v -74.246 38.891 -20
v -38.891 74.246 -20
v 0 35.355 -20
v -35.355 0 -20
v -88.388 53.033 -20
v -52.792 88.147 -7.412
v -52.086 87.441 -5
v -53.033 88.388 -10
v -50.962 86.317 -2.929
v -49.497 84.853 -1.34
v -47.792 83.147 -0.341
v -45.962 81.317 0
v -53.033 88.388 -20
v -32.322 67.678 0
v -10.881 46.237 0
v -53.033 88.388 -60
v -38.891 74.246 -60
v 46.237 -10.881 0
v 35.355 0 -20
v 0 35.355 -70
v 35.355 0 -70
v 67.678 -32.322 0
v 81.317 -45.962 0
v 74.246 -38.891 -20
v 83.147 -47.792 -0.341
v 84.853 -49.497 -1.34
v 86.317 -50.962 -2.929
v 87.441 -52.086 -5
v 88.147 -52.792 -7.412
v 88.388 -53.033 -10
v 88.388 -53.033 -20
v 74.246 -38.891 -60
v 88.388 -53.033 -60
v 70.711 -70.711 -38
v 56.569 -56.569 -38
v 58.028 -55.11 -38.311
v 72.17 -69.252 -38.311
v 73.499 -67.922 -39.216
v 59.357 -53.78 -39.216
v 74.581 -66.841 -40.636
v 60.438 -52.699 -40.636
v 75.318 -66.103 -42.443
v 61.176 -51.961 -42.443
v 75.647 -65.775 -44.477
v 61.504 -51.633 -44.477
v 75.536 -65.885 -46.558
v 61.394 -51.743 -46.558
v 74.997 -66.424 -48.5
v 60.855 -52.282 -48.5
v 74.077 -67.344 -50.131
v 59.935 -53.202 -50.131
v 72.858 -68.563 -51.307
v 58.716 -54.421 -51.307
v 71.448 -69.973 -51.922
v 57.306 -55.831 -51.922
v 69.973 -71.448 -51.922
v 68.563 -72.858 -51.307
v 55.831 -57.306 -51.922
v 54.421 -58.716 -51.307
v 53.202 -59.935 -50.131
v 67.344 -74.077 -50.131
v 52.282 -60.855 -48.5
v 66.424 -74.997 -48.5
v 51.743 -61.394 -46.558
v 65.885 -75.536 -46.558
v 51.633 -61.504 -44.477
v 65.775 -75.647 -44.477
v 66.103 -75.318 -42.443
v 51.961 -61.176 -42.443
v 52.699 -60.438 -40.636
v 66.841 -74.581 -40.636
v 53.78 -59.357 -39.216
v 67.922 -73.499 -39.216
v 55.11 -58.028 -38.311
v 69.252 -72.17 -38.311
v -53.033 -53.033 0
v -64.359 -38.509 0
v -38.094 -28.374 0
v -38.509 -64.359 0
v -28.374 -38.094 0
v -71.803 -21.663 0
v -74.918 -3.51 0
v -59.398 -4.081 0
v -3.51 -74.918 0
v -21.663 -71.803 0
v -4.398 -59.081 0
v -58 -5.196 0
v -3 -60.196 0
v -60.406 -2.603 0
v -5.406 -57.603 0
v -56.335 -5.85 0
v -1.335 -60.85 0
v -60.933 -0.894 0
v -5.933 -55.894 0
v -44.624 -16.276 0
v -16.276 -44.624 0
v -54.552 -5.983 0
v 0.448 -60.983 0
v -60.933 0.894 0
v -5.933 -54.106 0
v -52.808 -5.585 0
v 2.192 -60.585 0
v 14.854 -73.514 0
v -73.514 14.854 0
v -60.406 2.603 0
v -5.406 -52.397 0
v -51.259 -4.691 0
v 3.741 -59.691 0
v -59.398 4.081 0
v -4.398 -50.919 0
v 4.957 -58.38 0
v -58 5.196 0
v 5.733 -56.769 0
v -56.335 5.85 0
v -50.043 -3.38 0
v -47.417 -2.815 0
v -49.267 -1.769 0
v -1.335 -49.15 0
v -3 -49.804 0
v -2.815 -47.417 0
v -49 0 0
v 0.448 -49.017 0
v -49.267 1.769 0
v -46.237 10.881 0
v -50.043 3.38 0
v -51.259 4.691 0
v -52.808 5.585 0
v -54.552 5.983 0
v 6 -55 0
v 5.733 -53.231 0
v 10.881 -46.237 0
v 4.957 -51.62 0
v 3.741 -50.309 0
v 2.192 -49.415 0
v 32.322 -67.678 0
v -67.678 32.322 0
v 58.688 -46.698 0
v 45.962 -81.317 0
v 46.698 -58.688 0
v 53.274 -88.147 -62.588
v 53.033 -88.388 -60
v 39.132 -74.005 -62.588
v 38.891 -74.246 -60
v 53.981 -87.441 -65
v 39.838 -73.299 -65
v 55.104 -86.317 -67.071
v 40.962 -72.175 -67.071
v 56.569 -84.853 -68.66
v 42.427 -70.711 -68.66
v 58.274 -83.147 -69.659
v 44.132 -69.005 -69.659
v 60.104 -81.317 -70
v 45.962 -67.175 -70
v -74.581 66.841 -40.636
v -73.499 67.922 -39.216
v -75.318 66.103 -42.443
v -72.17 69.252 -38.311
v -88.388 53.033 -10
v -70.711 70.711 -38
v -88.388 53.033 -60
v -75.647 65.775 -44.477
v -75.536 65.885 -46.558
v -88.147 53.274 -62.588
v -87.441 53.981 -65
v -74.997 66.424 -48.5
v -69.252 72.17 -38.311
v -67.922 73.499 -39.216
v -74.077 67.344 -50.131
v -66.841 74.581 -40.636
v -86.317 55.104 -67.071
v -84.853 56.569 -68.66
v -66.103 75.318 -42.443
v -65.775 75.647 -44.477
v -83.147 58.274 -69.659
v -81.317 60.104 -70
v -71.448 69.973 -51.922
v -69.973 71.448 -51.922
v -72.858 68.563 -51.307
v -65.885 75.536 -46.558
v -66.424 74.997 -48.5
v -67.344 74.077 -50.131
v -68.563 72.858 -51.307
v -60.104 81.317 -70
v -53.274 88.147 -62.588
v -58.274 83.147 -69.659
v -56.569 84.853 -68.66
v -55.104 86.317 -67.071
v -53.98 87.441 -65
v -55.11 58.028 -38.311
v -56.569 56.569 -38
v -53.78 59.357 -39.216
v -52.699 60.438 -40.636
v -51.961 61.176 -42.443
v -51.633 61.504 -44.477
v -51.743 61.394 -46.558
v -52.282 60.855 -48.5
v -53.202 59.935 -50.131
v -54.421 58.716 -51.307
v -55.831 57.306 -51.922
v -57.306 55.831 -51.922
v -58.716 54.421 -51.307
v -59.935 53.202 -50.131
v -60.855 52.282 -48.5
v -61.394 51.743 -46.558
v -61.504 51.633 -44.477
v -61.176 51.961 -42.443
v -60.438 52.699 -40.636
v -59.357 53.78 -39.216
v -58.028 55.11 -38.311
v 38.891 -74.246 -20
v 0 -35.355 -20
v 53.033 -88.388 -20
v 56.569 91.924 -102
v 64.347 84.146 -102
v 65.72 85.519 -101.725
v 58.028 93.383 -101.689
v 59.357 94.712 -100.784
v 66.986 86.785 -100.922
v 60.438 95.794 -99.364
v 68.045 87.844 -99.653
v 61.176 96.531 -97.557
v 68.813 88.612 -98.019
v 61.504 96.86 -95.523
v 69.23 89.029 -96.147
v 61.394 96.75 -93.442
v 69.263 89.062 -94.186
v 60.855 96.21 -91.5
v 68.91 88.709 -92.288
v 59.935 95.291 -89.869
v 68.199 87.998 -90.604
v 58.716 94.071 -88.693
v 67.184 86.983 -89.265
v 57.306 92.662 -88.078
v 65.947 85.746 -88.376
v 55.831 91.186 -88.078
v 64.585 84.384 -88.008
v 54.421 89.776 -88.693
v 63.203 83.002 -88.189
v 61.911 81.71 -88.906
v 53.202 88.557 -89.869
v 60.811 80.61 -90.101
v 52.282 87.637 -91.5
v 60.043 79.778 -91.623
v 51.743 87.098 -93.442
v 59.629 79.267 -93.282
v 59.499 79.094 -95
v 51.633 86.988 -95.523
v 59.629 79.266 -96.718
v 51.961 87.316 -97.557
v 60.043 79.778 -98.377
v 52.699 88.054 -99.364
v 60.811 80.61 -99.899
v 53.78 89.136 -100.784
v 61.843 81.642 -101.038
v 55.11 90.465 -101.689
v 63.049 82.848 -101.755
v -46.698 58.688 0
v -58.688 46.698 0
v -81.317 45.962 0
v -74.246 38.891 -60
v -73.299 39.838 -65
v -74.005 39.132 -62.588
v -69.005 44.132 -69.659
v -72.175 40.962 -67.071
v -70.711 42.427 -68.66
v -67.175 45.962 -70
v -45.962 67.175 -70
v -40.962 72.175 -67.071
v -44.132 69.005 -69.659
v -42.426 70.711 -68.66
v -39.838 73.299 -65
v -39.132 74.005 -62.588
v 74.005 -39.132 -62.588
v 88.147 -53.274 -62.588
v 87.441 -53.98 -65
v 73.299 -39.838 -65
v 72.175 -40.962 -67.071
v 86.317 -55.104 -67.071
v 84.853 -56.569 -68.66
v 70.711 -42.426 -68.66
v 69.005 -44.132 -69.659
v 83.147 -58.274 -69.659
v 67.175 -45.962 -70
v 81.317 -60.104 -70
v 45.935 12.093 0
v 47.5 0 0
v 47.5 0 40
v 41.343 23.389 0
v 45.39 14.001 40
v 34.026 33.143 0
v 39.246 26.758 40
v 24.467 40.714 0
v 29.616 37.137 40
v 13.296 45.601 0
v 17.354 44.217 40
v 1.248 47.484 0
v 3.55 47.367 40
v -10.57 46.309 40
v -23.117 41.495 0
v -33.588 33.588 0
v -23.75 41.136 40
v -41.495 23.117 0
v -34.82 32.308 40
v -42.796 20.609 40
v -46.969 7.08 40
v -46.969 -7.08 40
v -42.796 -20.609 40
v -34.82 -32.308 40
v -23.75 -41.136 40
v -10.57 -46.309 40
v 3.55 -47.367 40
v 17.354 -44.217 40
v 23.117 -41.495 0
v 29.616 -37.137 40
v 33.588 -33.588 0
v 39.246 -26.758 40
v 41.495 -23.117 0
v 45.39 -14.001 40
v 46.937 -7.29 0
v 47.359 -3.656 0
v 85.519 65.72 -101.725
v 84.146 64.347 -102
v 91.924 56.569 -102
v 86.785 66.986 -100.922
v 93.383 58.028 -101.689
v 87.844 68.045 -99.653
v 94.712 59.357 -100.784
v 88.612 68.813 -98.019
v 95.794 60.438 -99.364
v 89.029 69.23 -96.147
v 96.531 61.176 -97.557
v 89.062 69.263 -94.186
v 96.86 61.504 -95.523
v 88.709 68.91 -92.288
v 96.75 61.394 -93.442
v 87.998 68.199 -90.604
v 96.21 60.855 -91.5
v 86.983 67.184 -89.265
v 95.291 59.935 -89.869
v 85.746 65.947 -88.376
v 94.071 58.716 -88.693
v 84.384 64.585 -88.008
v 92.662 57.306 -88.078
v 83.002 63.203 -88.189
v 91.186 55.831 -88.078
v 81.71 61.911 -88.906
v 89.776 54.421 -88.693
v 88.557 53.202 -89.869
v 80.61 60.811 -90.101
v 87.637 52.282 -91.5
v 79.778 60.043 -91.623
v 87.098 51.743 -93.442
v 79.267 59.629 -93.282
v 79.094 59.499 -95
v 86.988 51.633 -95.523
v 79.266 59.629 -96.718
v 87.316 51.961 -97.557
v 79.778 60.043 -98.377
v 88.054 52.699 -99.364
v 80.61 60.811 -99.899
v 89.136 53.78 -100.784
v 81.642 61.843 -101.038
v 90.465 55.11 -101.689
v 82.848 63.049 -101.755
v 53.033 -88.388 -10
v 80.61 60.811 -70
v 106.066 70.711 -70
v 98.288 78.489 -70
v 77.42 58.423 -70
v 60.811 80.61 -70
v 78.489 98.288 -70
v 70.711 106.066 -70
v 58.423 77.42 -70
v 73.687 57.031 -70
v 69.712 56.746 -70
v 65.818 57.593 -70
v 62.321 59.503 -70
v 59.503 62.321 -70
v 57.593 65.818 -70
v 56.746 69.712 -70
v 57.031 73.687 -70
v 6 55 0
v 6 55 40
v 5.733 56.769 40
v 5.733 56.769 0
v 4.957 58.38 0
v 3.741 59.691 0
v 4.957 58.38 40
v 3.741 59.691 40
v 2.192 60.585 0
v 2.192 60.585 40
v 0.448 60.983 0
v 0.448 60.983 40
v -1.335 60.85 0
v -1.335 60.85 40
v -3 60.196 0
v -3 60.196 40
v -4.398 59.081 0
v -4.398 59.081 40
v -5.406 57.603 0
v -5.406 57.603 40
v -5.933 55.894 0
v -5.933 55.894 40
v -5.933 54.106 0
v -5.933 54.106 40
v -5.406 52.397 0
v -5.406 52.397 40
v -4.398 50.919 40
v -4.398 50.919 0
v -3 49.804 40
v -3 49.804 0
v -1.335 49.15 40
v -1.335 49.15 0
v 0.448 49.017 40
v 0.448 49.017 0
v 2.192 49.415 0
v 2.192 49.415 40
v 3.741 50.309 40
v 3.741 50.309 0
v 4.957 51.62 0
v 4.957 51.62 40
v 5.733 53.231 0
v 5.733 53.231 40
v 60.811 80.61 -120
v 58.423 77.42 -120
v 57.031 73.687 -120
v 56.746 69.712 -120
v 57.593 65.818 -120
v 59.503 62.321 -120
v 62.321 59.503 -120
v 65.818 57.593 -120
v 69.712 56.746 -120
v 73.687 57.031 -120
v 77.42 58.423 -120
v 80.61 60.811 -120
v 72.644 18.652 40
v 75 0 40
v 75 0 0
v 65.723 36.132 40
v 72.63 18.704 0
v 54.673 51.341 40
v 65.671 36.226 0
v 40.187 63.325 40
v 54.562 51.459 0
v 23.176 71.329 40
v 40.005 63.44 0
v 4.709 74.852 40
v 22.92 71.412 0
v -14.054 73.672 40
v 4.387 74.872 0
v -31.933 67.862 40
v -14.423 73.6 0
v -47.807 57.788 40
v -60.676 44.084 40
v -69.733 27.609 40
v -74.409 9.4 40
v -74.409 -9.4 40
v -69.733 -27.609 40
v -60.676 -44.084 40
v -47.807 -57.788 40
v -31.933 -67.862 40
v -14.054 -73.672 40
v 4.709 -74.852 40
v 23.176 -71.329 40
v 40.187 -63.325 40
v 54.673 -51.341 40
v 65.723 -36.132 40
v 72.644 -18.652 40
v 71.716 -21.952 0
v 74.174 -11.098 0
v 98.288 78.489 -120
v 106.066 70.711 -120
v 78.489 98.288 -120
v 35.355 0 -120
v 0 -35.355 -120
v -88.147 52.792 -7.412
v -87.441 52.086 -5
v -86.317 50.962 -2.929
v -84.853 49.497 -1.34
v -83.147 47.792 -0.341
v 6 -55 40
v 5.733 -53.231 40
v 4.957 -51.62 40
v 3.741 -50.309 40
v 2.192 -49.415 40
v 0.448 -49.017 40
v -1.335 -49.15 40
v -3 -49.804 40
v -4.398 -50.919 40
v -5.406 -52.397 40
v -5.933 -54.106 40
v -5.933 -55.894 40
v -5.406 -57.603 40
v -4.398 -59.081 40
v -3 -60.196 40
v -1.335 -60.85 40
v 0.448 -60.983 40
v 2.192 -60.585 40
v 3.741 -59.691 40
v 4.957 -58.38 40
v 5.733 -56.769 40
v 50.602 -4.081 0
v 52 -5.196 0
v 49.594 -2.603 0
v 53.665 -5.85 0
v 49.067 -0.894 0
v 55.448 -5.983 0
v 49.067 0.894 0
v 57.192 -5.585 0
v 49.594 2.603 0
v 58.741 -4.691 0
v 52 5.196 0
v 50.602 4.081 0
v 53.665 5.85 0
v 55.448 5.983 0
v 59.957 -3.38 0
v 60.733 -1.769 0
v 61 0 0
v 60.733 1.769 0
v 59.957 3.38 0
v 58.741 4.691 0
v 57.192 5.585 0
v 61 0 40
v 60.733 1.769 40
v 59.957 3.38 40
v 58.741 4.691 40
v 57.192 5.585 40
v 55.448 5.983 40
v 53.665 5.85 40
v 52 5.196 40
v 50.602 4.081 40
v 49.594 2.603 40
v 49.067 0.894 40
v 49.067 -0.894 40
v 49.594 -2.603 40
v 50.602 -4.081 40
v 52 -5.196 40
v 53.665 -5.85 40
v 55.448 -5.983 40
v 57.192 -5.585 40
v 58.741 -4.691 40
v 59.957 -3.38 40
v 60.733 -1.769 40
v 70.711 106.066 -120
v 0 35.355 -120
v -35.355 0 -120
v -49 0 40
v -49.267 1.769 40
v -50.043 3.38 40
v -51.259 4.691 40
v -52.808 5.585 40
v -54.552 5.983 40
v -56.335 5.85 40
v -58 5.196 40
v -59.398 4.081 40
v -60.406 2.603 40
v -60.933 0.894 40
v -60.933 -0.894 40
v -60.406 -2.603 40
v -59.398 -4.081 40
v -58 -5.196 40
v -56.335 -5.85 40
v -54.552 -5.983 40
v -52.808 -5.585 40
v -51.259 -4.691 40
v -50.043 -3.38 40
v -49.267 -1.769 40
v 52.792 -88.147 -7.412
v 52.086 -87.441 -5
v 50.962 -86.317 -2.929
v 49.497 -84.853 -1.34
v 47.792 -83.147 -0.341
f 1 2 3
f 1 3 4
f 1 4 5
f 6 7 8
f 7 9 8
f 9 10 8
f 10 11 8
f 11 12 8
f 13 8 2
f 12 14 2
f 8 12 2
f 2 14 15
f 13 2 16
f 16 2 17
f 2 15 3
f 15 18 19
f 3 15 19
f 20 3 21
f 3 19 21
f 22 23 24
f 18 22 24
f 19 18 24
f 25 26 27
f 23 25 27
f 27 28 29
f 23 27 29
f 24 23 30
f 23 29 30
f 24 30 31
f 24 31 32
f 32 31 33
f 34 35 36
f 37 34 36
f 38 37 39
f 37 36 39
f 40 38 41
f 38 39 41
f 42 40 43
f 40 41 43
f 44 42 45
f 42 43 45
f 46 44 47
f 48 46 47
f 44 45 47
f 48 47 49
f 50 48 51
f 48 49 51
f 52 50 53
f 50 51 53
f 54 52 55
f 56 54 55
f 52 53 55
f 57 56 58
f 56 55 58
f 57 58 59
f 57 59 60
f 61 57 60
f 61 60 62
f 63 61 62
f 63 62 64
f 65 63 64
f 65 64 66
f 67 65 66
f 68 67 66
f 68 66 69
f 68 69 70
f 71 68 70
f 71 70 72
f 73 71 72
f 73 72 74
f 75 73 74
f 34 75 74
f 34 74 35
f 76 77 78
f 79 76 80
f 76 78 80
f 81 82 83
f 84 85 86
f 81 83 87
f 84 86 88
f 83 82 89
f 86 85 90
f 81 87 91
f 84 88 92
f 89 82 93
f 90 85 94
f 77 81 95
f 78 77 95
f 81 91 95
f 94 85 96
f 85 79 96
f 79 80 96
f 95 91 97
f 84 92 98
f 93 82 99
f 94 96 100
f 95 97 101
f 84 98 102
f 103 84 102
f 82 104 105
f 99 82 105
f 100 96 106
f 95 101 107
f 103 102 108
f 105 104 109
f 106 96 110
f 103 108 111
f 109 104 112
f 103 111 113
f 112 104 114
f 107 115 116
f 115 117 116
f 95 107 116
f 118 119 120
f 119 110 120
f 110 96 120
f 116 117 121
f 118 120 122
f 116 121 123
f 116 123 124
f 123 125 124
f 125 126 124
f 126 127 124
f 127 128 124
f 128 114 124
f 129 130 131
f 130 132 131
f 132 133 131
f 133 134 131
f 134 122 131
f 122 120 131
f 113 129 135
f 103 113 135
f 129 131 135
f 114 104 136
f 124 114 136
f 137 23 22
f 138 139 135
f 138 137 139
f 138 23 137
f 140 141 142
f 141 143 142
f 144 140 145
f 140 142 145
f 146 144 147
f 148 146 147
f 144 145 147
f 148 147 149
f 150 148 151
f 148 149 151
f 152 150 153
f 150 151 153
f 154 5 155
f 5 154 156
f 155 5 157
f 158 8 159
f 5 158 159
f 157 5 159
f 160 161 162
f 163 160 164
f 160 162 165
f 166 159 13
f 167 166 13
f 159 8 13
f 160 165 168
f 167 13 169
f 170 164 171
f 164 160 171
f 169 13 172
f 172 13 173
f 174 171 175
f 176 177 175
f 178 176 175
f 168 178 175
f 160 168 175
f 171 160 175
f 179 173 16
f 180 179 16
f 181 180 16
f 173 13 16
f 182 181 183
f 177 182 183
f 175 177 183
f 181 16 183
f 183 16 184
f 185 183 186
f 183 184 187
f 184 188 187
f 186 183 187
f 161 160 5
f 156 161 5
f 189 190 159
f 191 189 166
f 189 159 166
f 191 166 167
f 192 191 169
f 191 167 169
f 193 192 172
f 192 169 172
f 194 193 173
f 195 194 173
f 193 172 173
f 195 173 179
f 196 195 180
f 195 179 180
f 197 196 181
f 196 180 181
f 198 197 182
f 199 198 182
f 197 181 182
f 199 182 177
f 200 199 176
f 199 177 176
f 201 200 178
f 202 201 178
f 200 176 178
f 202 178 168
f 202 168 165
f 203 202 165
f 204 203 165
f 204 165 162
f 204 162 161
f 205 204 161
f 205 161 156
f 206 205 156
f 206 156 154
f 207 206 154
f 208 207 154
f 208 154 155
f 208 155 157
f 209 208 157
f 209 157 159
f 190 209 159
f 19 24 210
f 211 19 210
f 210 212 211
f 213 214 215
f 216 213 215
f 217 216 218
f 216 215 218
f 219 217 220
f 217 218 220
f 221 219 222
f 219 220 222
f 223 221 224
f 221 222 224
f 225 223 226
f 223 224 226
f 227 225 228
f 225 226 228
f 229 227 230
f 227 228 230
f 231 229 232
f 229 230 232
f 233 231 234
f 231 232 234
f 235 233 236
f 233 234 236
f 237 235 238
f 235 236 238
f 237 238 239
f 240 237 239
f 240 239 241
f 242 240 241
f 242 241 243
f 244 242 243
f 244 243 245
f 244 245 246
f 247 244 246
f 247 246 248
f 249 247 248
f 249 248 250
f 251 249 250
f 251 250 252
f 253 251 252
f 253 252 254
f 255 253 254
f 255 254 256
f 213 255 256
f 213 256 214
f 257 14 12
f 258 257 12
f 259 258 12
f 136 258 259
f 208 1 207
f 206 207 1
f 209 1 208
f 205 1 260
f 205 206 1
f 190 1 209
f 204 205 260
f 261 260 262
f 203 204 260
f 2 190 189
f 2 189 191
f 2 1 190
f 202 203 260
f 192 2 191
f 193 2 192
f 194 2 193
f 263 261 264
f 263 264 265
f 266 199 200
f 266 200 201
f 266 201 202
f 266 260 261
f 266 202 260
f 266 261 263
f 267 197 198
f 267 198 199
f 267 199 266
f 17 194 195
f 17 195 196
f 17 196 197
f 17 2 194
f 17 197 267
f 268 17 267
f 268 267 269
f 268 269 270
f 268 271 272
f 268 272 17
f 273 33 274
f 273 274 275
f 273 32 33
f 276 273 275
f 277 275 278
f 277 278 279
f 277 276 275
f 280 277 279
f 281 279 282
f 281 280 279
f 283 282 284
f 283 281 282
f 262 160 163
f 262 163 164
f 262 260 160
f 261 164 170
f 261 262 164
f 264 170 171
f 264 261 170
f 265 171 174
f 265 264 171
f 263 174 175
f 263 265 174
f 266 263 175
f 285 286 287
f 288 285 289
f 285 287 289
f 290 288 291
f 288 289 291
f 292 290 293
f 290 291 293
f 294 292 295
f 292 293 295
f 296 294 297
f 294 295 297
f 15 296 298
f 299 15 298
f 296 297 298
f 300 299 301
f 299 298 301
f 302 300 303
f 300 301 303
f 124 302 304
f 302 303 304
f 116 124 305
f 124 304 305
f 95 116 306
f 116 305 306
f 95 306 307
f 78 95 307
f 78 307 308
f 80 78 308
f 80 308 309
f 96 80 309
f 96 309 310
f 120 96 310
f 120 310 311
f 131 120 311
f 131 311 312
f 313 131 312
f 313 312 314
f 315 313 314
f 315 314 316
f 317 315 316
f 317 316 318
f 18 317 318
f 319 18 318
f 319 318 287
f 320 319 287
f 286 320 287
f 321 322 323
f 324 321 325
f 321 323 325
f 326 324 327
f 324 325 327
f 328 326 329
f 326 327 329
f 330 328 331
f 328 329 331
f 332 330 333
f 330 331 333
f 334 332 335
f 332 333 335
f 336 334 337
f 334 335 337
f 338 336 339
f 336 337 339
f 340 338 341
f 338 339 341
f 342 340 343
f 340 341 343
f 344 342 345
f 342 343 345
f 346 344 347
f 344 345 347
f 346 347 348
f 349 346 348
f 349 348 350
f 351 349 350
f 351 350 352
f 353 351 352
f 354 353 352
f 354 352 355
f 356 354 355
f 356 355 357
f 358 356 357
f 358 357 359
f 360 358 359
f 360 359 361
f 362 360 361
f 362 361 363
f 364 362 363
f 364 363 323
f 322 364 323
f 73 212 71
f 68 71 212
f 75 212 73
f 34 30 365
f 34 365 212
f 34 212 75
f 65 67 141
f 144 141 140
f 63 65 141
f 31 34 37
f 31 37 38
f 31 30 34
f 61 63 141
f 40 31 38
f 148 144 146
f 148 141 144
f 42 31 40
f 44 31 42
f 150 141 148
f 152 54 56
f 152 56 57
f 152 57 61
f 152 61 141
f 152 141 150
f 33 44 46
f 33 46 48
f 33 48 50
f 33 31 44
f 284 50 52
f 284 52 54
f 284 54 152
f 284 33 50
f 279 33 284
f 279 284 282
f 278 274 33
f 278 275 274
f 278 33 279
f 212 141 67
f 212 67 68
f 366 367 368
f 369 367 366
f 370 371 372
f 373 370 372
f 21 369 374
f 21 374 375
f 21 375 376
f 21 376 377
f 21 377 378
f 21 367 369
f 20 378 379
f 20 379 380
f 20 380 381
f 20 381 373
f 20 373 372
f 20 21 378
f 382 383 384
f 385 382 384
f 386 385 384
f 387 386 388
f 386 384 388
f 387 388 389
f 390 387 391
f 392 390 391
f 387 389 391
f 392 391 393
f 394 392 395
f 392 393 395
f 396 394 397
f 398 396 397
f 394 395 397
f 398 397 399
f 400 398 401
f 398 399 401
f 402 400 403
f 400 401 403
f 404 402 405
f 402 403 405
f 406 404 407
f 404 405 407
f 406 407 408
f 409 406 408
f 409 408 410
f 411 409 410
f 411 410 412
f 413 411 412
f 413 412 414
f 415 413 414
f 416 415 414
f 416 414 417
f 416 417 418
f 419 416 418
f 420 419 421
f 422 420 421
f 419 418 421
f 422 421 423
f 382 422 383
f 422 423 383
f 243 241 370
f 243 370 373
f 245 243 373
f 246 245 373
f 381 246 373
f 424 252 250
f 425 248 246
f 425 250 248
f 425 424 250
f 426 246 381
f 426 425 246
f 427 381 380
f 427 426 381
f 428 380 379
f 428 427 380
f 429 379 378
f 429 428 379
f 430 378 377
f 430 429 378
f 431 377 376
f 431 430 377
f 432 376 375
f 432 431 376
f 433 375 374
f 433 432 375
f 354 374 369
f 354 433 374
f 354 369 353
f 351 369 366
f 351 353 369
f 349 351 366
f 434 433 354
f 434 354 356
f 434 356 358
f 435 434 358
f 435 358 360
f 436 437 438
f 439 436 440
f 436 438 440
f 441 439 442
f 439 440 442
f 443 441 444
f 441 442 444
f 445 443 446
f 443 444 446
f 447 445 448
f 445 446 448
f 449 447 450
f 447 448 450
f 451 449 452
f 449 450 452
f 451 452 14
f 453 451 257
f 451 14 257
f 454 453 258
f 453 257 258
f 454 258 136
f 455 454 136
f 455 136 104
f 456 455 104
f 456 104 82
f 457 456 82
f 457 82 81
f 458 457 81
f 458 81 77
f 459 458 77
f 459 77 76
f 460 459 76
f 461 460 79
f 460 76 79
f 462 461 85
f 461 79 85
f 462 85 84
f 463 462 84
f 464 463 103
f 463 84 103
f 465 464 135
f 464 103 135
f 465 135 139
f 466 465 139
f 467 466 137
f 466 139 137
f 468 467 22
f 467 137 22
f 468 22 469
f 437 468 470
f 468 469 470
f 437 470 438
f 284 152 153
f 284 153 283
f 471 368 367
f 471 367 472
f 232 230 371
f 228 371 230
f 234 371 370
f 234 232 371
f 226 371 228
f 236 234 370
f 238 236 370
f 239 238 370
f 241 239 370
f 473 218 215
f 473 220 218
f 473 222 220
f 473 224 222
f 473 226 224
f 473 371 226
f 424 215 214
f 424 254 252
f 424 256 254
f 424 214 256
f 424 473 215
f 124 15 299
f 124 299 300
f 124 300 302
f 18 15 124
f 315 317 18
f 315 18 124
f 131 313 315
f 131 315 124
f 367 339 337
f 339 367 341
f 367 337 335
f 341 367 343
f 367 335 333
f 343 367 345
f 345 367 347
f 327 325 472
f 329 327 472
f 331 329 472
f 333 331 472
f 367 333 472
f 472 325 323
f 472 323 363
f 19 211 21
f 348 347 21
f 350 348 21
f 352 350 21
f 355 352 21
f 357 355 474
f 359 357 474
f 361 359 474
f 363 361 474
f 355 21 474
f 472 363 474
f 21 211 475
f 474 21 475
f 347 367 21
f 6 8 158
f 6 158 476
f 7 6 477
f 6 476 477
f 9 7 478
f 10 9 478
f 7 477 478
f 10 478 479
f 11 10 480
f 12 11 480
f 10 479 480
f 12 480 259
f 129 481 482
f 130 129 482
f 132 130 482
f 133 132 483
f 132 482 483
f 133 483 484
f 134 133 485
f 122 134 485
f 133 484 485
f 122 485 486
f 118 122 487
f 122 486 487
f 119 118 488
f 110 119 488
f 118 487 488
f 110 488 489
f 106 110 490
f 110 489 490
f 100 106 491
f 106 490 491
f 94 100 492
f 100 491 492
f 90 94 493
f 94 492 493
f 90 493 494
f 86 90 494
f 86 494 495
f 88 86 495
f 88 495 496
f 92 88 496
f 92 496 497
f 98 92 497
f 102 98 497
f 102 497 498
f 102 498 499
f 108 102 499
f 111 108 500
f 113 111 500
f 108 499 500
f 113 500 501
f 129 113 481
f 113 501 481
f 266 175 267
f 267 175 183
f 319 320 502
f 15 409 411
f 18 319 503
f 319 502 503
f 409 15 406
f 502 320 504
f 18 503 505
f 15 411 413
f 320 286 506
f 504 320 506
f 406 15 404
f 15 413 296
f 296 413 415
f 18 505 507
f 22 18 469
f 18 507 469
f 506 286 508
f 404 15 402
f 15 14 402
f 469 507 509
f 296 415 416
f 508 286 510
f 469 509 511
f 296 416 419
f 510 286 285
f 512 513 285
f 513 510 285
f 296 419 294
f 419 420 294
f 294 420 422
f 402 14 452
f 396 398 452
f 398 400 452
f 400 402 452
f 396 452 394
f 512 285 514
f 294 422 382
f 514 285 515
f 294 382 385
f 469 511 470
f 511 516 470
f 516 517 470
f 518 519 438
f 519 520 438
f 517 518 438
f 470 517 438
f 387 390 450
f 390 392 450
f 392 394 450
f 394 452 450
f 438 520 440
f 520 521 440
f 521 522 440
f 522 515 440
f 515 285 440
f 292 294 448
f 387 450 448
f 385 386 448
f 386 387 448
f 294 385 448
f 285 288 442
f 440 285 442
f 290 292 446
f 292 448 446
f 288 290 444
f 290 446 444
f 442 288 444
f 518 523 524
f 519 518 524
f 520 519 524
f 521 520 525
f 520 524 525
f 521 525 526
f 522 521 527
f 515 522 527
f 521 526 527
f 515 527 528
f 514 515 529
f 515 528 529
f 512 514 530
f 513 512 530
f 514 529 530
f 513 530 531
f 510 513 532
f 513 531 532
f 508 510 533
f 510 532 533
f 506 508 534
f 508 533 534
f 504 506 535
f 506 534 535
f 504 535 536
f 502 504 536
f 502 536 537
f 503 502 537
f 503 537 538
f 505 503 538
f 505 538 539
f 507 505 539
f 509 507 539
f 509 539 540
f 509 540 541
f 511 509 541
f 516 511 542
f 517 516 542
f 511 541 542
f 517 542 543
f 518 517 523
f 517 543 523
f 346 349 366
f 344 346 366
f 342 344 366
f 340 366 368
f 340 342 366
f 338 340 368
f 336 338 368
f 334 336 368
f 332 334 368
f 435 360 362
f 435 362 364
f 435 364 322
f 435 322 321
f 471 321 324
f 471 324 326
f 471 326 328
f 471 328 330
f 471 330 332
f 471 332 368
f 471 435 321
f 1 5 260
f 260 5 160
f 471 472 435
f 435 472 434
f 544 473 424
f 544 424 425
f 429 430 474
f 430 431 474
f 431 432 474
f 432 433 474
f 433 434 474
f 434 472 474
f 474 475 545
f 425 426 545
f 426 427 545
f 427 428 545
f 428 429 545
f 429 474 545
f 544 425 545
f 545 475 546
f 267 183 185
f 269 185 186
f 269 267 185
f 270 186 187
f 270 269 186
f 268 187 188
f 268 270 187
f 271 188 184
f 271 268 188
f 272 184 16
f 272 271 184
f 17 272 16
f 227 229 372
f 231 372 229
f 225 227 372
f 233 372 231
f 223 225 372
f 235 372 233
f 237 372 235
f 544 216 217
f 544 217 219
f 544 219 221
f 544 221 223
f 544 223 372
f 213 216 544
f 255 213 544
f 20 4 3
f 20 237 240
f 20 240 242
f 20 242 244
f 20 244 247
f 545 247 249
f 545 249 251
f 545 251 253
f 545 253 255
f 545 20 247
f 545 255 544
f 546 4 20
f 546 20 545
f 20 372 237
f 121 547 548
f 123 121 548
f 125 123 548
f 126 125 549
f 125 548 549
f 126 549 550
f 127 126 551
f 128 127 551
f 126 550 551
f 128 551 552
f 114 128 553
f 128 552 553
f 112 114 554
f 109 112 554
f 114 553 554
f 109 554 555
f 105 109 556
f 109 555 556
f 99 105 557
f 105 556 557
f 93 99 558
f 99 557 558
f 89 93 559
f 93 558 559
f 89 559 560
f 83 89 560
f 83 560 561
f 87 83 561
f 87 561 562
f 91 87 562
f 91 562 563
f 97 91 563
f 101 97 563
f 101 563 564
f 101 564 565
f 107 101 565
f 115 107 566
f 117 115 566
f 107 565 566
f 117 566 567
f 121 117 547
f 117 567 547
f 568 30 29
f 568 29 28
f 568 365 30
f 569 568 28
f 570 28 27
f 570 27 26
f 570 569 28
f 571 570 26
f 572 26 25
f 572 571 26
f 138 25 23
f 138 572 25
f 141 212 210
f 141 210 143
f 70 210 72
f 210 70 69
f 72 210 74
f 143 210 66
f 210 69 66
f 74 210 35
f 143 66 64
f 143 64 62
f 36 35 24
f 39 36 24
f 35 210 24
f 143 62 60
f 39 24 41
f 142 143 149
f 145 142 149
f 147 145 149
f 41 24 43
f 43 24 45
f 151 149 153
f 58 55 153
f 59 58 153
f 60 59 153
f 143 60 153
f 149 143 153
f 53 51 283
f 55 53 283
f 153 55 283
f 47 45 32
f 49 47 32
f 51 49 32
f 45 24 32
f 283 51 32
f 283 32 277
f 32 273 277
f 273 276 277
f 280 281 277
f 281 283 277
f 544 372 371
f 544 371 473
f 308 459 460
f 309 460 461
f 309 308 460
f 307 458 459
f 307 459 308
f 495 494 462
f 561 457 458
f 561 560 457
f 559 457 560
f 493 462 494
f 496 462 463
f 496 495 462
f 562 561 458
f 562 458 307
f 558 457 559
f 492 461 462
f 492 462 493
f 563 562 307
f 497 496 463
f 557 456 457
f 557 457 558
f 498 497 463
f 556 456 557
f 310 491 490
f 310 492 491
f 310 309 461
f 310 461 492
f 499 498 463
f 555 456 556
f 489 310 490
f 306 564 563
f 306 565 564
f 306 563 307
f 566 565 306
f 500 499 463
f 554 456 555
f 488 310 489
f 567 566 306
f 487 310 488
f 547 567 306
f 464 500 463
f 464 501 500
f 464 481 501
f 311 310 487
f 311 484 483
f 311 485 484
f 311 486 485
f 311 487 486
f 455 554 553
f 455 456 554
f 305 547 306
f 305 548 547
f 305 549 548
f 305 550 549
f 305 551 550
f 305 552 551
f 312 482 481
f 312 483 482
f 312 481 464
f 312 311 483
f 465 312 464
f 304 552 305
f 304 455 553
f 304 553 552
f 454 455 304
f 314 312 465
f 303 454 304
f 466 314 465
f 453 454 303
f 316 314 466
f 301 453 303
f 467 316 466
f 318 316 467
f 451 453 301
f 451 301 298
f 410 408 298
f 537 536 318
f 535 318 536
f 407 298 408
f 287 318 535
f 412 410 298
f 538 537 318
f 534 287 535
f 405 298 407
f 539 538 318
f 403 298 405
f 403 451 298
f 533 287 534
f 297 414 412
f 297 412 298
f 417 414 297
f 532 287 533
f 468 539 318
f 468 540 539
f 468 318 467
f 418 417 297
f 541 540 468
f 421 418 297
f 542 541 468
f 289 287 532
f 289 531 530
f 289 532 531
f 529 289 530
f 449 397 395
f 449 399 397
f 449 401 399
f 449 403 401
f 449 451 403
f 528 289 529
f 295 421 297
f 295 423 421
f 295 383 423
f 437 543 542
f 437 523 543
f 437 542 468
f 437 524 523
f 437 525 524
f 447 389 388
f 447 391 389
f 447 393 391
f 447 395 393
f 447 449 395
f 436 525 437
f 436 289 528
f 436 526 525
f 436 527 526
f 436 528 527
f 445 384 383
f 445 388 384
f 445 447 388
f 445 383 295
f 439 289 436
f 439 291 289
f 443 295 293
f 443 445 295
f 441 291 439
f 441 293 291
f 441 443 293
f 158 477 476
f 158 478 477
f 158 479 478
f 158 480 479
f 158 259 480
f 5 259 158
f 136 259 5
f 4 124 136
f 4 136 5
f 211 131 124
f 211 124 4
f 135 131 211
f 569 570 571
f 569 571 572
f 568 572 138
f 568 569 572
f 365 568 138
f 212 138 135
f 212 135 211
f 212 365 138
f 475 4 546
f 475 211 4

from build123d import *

# Parameters (mm, degrees)
SZKIC1_R                    = 75
DODANIE_WYCI_GNI_CIE1_DEPTH = 40
SZKIC2_R                    = 6
WYTNIJ_WYCI_GNI_CIE1_DEPTH  = 40
SZKIC3_R                    = 47.5
WYTNIJ_WYCI_GNI_CIE2_DEPTH  = 40
SZKIC4_W                    = 50
SZKIC4_H                    = 20
DODANIE_WYCI_GNI_CIE2_DEPTH = 100
SZKIC6_W                    = 50
SZKIC6_H                    = 49.999779654
DODANIE_WYCI_GNI_CIE3_DEPTH = 20
SZKIC7_R                    = 7
WYTNIJ_WYCI_GNI_CIE3_DEPTH  = 226
ZAOKR_GLENIE1_R             = 10
ZAOKR_GLENIE2_R             = 10
DODANIE_WYCI_GNI_CIE4_DEPTH = 100
SZKIC10_W                   = 50
SZKIC10_H                   = 50
DODANIE_WYCI_GNI_CIE5_DEPTH = 100
SZKIC12_R                   = 7
WYTNIJ_WYCI_GNI_CIE5_DEPTH  = 163.5
WYTNIJ_WYCI_GNI_CIE6_DEPTH  = 161


with BuildPart() as part:
    # Szkic1 → Dodanie-wyciągnięcie1 (new body)
    with BuildSketch(Plane.XY):
        Circle(SZKIC1_R)
    extrude(amount=DODANIE_WYCI_GNI_CIE1_DEPTH)

    # Szkic2 → Wytnij-wyciągnięcie1 (cut)
    with BuildSketch(Plane.XY.offset(40)):
        with Locations((-55, 0)):
            Circle(SZKIC2_R)
        with Locations((0, 55)):
            Circle(SZKIC2_R)
        with Locations((55, 0)):
            Circle(SZKIC2_R)
        with Locations((0, -55)):
            Circle(SZKIC2_R)
    extrude(amount=-WYTNIJ_WYCI_GNI_CIE1_DEPTH, mode=Mode.SUBTRACT)

    # Szkic3 → Wytnij-wyciągnięcie2 (cut)
    with BuildSketch(Plane.XY.offset(40)):
        Circle(SZKIC3_R)
    extrude(amount=-WYTNIJ_WYCI_GNI_CIE2_DEPTH, mode=Mode.SUBTRACT)

    # Szkic4 → Dodanie-wyciągnięcie2 (add, symmetric)
    with BuildSketch(Plane(origin=(0, 0, 0), x_dir=(-0.707106781, -0.707106781, 0), z_dir=(0.707106781, -0.707106781, 0))):
        with Locations((0, 10)):
            Rectangle(SZKIC4_W, SZKIC4_H)
    extrude(amount=DODANIE_WYCI_GNI_CIE2_DEPTH, both=True)

    # Szkic6 → Dodanie-wyciągnięcie3 (add)
    with BuildSketch(Plane(origin=(70.710678119, -70.710678119, 0), x_dir=(0, 0, -1), z_dir=(0.707106781, -0.707106781, 0))):
        with Locations((45, 0.000110173)):
            Rectangle(SZKIC6_W, SZKIC6_H)
    dodanie_wyci_gni_cie3 = extrude(amount=-DODANIE_WYCI_GNI_CIE3_DEPTH)

    # Lustro1: Dodanie-wyciągnięcie3 across plane
    add(dodanie_wyci_gni_cie3.mirror(Plane(origin=(0, 0, 0), x_dir=(0, 0, 1), z_dir=(0.707106781, -0.707106781, 0))))

    # Szkic7 → Wytnij-wyciągnięcie3 (cut, through all)
    with BuildSketch(Plane(origin=(-70.710678119, 70.710678119, 0), x_dir=(0, 0, 1), z_dir=(-0.707106781, 0.707106781, 0))):
        with Locations((-45, 0)):
            Circle(SZKIC7_R)
    extrude(amount=-WYTNIJ_WYCI_GNI_CIE3_DEPTH, mode=Mode.SUBTRACT)

    # Zaokrąglenie1
    zaokr_glenie1_edges = [part.edges().sort_by_distance(p)[0] for p in [
        (81.317279836, -45.961940777, -70),
        (45.962096585, -81.317124028, -70),
        (-81.317124028, 45.962096585, -70),
        (-45.961940777, 81.317279836, -70),
    ]]
    fillet(zaokr_glenie1_edges, radius=ZAOKR_GLENIE1_R)

    # Zaokrąglenie2
    zaokr_glenie2_edges = [part.edges().sort_by_distance(p)[0] for p in [
        (-70.710678119, 70.710678119, 0),
        (70.710678119, -70.710678119, 0),
    ]]
    fillet(zaokr_glenie2_edges, radius=ZAOKR_GLENIE2_R)

    # Szkic8 → Dodanie-wyciągnięcie4 (add)
    with BuildSketch(Plane(origin=(0, 0, -20), x_dir=(-1, 0, 0), z_dir=(0, 0, -1))):
        Polygon((0, 35.355339059), (35.355339059, 0), (0, -35.355339059), (-35.355339059, 0), align=None)
    extrude(amount=DODANIE_WYCI_GNI_CIE4_DEPTH)

    # Szkic10 → Dodanie-wyciągnięcie5 (add)
    with BuildSketch(Plane(origin=(17.67766953, 17.67766953, 0), x_dir=(0, 0, -1), z_dir=(0.707106781, 0.707106781, 0))):
        with Locations((95, 0)):
            Rectangle(SZKIC10_W, SZKIC10_H)
    extrude(amount=DODANIE_WYCI_GNI_CIE5_DEPTH)

    # Szkic12 → Wytnij-wyciągnięcie5 (cut, through all)
    with BuildSketch(Plane(origin=(17.67766953, -17.67766953, 0), x_dir=(0, 0, -1), z_dir=(0.707106781, -0.707106781, 0))):
        with Locations((95, 105)):
            Circle(SZKIC12_R)
    extrude(amount=-WYTNIJ_WYCI_GNI_CIE5_DEPTH, mode=Mode.SUBTRACT)

    # Szkic14 → Wytnij-wyciągnięcie6 (cut, through all)
    with BuildSketch(Plane(origin=(0, 0, -120), x_dir=(-1, 0, 0), z_dir=(0, 0, -1))):
        with BuildLine():
            Line((-80.610173055, 60.811183182), (-98.287842585, 78.488852712))
            Line((-98.287842585, 78.488852712), (-78.488852712, 98.287842585))
            Line((-78.488852712, 98.287842585), (-60.811183182, 80.610173055))
            ThreePointArc((-60.811183182, 80.610173055), (-60.811183182, 60.811183182), (-80.610173055, 60.811183182))
        make_face()
    extrude(amount=-WYTNIJ_WYCI_GNI_CIE6_DEPTH, mode=Mode.SUBTRACT)


solid = part.part
